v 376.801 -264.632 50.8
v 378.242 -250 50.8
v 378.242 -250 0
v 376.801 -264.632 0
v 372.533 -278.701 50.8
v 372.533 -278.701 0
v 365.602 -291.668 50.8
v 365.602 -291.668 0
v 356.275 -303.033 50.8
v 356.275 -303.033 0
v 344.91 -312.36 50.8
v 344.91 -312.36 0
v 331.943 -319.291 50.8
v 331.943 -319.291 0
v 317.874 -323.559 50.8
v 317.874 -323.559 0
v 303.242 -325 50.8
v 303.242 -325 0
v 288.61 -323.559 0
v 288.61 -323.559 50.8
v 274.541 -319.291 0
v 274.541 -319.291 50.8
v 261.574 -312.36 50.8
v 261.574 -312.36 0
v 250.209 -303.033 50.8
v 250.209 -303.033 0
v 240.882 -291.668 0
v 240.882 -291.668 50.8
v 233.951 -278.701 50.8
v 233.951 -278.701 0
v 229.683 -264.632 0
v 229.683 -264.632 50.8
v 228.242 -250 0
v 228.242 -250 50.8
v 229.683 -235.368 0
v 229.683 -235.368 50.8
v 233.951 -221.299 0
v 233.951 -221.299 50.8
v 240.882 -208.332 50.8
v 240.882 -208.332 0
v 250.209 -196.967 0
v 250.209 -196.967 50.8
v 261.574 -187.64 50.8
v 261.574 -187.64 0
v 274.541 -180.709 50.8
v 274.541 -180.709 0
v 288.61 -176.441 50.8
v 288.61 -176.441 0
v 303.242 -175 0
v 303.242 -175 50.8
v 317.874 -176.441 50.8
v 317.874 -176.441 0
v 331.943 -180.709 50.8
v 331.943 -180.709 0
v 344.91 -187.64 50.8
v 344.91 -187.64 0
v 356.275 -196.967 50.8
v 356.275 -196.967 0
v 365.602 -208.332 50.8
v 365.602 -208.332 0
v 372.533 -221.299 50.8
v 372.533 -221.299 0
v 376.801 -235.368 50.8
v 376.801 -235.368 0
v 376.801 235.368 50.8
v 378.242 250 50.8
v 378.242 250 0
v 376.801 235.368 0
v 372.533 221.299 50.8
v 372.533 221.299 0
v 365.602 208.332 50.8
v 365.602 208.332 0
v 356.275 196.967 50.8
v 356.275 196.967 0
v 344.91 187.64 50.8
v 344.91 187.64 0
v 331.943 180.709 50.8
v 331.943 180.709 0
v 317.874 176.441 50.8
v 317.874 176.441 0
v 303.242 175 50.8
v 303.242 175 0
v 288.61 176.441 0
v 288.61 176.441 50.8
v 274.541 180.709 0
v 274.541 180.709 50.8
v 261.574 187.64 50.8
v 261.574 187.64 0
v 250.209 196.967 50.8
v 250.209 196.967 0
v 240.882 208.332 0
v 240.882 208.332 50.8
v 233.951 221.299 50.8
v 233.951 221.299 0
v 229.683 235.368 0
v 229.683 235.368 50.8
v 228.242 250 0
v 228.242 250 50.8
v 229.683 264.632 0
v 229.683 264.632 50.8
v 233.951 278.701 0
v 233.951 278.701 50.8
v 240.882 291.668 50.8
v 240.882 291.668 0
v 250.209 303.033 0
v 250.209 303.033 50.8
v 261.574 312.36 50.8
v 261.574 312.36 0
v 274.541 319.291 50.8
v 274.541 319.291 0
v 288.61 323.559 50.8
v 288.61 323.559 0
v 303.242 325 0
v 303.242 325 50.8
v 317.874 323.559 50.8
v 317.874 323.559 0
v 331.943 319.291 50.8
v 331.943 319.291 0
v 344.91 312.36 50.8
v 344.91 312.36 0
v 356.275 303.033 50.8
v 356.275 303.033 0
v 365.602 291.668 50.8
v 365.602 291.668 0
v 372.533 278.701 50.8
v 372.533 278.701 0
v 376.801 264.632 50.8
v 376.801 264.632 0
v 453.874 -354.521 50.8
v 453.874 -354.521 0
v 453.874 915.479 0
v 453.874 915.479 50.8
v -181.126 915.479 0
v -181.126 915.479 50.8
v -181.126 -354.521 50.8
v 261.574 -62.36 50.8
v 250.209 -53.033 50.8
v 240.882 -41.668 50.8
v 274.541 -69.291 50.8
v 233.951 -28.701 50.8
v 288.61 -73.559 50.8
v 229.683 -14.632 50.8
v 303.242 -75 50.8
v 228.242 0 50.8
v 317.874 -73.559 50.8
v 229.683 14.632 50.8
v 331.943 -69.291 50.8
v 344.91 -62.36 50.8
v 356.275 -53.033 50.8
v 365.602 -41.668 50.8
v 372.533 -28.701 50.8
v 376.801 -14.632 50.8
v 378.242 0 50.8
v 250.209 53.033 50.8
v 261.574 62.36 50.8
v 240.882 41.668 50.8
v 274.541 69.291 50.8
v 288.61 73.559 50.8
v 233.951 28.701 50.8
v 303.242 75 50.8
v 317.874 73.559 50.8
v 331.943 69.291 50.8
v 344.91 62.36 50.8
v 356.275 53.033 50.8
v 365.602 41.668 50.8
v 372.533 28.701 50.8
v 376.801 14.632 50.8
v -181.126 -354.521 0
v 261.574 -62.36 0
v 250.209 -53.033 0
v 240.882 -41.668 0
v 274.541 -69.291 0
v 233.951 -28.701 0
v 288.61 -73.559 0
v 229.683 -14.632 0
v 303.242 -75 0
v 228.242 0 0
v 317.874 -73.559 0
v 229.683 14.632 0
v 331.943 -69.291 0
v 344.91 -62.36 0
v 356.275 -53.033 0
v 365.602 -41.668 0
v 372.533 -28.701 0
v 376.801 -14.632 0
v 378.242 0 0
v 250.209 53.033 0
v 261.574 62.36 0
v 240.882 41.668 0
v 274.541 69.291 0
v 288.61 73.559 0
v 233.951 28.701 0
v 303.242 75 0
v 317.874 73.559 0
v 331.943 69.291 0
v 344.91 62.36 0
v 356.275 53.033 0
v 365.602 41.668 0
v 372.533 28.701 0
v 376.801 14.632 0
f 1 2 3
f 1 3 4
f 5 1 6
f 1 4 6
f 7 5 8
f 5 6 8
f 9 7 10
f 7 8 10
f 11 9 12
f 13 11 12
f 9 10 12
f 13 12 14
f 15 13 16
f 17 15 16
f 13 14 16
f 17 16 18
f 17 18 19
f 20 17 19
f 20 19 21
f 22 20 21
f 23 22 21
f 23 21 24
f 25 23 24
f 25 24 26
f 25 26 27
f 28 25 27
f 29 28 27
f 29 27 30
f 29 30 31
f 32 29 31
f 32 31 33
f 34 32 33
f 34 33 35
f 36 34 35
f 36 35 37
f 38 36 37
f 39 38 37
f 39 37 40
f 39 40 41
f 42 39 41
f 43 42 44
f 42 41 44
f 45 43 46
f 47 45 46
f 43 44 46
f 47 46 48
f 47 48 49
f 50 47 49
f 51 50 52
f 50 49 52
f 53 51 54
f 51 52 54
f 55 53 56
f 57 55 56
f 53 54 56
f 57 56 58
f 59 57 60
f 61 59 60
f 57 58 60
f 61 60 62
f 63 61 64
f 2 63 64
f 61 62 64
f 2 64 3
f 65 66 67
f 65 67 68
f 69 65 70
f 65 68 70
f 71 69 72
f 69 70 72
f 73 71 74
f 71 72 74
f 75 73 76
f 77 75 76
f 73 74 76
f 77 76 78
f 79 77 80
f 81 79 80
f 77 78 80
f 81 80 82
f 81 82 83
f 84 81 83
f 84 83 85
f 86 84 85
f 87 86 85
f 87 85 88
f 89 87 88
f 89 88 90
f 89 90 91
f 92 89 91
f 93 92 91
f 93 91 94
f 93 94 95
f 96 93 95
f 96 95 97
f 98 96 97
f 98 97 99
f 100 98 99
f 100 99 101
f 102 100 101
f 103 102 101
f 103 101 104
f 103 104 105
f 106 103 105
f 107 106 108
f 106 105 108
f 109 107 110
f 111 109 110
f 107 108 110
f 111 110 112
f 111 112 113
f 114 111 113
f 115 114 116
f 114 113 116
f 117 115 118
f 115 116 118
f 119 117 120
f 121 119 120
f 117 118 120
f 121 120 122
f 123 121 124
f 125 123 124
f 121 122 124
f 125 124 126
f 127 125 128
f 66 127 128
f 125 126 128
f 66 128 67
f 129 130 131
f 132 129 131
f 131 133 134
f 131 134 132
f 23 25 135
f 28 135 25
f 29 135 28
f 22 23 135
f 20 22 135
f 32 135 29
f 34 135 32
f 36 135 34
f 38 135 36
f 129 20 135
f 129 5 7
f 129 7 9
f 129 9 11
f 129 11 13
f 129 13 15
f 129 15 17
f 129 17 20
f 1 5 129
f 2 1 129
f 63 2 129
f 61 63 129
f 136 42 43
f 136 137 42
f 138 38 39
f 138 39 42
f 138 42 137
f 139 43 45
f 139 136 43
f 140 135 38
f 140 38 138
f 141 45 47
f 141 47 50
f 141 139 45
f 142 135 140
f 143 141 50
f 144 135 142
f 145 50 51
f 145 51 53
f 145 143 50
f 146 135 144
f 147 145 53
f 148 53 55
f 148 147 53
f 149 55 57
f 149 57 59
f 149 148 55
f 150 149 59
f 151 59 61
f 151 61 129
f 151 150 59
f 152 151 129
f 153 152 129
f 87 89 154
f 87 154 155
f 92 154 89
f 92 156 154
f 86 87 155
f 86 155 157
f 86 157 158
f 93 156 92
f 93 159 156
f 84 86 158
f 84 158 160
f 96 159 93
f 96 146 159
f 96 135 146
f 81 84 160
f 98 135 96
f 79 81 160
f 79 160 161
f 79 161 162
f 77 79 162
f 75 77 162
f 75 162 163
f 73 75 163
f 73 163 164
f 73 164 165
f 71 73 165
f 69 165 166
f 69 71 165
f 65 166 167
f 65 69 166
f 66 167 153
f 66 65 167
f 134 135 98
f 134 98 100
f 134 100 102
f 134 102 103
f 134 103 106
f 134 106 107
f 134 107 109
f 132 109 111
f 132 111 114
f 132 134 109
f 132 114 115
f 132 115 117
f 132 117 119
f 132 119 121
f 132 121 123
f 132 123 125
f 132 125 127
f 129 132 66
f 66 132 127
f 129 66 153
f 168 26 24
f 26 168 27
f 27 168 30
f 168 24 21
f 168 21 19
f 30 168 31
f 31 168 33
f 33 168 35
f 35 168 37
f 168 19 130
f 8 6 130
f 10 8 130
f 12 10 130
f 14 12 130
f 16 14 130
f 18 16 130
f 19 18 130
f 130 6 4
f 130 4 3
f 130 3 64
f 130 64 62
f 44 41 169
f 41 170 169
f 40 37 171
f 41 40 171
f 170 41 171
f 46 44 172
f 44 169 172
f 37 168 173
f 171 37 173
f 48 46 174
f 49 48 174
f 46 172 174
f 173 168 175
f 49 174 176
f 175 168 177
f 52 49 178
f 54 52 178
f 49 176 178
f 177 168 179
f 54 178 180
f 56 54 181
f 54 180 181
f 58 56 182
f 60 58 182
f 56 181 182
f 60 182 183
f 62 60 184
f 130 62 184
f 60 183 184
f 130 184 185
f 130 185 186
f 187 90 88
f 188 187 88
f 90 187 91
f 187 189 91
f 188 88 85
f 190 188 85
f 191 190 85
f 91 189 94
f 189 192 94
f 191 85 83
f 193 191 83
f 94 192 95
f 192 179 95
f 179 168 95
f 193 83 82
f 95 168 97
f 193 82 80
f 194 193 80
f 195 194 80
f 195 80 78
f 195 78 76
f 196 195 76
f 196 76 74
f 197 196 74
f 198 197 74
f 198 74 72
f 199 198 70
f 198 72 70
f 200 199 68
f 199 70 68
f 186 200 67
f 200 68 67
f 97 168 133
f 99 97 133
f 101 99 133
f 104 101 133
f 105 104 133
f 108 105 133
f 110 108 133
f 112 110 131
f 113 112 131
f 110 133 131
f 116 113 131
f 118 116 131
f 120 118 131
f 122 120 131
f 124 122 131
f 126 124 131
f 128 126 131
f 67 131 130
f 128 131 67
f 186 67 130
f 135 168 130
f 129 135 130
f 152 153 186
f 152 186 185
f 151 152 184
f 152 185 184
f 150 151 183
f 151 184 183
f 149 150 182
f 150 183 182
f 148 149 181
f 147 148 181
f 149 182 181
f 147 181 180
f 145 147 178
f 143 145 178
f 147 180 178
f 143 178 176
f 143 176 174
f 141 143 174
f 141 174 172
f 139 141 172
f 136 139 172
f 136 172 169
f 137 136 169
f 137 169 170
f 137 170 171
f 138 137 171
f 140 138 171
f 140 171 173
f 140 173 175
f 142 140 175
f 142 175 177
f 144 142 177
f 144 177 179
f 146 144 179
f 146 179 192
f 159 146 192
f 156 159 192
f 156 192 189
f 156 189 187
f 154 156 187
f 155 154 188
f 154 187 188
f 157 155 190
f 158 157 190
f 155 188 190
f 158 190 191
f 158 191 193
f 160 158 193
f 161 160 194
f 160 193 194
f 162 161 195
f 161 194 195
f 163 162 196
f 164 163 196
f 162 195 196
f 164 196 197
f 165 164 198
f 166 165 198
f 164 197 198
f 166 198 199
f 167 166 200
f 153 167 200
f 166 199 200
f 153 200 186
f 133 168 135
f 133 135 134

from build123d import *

# Parameters (mm, degrees)
F0_W     = 635
F0_H     = 1270
F1_DEPTH = 50.8
F2_R     = 75
F3_DEPTH = 347


with BuildPart() as f1:
    # F0 (on Top) → F1 (new body)
    with BuildSketch(Plane.XY):
        with Locations((136.374186, 280.478615)):
            Rectangle(F0_W, F0_H)
    extrude(amount=F1_DEPTH)

    # F2 (on face) → F3 (cut)
    with BuildSketch(Plane(origin=(0, 0, 0), x_dir=(1, 0, 0), z_dir=(0, 0, -1))):
        with Locations((303.242054, 250)):
            Circle(F2_R)
        with Locations((303.242054, 0)):
            Circle(F2_R)
        with Locations((303.242054, -250)):
            Circle(F2_R)
    extrude(amount=-F3_DEPTH, mode=Mode.SUBTRACT)


solid = f1.part
